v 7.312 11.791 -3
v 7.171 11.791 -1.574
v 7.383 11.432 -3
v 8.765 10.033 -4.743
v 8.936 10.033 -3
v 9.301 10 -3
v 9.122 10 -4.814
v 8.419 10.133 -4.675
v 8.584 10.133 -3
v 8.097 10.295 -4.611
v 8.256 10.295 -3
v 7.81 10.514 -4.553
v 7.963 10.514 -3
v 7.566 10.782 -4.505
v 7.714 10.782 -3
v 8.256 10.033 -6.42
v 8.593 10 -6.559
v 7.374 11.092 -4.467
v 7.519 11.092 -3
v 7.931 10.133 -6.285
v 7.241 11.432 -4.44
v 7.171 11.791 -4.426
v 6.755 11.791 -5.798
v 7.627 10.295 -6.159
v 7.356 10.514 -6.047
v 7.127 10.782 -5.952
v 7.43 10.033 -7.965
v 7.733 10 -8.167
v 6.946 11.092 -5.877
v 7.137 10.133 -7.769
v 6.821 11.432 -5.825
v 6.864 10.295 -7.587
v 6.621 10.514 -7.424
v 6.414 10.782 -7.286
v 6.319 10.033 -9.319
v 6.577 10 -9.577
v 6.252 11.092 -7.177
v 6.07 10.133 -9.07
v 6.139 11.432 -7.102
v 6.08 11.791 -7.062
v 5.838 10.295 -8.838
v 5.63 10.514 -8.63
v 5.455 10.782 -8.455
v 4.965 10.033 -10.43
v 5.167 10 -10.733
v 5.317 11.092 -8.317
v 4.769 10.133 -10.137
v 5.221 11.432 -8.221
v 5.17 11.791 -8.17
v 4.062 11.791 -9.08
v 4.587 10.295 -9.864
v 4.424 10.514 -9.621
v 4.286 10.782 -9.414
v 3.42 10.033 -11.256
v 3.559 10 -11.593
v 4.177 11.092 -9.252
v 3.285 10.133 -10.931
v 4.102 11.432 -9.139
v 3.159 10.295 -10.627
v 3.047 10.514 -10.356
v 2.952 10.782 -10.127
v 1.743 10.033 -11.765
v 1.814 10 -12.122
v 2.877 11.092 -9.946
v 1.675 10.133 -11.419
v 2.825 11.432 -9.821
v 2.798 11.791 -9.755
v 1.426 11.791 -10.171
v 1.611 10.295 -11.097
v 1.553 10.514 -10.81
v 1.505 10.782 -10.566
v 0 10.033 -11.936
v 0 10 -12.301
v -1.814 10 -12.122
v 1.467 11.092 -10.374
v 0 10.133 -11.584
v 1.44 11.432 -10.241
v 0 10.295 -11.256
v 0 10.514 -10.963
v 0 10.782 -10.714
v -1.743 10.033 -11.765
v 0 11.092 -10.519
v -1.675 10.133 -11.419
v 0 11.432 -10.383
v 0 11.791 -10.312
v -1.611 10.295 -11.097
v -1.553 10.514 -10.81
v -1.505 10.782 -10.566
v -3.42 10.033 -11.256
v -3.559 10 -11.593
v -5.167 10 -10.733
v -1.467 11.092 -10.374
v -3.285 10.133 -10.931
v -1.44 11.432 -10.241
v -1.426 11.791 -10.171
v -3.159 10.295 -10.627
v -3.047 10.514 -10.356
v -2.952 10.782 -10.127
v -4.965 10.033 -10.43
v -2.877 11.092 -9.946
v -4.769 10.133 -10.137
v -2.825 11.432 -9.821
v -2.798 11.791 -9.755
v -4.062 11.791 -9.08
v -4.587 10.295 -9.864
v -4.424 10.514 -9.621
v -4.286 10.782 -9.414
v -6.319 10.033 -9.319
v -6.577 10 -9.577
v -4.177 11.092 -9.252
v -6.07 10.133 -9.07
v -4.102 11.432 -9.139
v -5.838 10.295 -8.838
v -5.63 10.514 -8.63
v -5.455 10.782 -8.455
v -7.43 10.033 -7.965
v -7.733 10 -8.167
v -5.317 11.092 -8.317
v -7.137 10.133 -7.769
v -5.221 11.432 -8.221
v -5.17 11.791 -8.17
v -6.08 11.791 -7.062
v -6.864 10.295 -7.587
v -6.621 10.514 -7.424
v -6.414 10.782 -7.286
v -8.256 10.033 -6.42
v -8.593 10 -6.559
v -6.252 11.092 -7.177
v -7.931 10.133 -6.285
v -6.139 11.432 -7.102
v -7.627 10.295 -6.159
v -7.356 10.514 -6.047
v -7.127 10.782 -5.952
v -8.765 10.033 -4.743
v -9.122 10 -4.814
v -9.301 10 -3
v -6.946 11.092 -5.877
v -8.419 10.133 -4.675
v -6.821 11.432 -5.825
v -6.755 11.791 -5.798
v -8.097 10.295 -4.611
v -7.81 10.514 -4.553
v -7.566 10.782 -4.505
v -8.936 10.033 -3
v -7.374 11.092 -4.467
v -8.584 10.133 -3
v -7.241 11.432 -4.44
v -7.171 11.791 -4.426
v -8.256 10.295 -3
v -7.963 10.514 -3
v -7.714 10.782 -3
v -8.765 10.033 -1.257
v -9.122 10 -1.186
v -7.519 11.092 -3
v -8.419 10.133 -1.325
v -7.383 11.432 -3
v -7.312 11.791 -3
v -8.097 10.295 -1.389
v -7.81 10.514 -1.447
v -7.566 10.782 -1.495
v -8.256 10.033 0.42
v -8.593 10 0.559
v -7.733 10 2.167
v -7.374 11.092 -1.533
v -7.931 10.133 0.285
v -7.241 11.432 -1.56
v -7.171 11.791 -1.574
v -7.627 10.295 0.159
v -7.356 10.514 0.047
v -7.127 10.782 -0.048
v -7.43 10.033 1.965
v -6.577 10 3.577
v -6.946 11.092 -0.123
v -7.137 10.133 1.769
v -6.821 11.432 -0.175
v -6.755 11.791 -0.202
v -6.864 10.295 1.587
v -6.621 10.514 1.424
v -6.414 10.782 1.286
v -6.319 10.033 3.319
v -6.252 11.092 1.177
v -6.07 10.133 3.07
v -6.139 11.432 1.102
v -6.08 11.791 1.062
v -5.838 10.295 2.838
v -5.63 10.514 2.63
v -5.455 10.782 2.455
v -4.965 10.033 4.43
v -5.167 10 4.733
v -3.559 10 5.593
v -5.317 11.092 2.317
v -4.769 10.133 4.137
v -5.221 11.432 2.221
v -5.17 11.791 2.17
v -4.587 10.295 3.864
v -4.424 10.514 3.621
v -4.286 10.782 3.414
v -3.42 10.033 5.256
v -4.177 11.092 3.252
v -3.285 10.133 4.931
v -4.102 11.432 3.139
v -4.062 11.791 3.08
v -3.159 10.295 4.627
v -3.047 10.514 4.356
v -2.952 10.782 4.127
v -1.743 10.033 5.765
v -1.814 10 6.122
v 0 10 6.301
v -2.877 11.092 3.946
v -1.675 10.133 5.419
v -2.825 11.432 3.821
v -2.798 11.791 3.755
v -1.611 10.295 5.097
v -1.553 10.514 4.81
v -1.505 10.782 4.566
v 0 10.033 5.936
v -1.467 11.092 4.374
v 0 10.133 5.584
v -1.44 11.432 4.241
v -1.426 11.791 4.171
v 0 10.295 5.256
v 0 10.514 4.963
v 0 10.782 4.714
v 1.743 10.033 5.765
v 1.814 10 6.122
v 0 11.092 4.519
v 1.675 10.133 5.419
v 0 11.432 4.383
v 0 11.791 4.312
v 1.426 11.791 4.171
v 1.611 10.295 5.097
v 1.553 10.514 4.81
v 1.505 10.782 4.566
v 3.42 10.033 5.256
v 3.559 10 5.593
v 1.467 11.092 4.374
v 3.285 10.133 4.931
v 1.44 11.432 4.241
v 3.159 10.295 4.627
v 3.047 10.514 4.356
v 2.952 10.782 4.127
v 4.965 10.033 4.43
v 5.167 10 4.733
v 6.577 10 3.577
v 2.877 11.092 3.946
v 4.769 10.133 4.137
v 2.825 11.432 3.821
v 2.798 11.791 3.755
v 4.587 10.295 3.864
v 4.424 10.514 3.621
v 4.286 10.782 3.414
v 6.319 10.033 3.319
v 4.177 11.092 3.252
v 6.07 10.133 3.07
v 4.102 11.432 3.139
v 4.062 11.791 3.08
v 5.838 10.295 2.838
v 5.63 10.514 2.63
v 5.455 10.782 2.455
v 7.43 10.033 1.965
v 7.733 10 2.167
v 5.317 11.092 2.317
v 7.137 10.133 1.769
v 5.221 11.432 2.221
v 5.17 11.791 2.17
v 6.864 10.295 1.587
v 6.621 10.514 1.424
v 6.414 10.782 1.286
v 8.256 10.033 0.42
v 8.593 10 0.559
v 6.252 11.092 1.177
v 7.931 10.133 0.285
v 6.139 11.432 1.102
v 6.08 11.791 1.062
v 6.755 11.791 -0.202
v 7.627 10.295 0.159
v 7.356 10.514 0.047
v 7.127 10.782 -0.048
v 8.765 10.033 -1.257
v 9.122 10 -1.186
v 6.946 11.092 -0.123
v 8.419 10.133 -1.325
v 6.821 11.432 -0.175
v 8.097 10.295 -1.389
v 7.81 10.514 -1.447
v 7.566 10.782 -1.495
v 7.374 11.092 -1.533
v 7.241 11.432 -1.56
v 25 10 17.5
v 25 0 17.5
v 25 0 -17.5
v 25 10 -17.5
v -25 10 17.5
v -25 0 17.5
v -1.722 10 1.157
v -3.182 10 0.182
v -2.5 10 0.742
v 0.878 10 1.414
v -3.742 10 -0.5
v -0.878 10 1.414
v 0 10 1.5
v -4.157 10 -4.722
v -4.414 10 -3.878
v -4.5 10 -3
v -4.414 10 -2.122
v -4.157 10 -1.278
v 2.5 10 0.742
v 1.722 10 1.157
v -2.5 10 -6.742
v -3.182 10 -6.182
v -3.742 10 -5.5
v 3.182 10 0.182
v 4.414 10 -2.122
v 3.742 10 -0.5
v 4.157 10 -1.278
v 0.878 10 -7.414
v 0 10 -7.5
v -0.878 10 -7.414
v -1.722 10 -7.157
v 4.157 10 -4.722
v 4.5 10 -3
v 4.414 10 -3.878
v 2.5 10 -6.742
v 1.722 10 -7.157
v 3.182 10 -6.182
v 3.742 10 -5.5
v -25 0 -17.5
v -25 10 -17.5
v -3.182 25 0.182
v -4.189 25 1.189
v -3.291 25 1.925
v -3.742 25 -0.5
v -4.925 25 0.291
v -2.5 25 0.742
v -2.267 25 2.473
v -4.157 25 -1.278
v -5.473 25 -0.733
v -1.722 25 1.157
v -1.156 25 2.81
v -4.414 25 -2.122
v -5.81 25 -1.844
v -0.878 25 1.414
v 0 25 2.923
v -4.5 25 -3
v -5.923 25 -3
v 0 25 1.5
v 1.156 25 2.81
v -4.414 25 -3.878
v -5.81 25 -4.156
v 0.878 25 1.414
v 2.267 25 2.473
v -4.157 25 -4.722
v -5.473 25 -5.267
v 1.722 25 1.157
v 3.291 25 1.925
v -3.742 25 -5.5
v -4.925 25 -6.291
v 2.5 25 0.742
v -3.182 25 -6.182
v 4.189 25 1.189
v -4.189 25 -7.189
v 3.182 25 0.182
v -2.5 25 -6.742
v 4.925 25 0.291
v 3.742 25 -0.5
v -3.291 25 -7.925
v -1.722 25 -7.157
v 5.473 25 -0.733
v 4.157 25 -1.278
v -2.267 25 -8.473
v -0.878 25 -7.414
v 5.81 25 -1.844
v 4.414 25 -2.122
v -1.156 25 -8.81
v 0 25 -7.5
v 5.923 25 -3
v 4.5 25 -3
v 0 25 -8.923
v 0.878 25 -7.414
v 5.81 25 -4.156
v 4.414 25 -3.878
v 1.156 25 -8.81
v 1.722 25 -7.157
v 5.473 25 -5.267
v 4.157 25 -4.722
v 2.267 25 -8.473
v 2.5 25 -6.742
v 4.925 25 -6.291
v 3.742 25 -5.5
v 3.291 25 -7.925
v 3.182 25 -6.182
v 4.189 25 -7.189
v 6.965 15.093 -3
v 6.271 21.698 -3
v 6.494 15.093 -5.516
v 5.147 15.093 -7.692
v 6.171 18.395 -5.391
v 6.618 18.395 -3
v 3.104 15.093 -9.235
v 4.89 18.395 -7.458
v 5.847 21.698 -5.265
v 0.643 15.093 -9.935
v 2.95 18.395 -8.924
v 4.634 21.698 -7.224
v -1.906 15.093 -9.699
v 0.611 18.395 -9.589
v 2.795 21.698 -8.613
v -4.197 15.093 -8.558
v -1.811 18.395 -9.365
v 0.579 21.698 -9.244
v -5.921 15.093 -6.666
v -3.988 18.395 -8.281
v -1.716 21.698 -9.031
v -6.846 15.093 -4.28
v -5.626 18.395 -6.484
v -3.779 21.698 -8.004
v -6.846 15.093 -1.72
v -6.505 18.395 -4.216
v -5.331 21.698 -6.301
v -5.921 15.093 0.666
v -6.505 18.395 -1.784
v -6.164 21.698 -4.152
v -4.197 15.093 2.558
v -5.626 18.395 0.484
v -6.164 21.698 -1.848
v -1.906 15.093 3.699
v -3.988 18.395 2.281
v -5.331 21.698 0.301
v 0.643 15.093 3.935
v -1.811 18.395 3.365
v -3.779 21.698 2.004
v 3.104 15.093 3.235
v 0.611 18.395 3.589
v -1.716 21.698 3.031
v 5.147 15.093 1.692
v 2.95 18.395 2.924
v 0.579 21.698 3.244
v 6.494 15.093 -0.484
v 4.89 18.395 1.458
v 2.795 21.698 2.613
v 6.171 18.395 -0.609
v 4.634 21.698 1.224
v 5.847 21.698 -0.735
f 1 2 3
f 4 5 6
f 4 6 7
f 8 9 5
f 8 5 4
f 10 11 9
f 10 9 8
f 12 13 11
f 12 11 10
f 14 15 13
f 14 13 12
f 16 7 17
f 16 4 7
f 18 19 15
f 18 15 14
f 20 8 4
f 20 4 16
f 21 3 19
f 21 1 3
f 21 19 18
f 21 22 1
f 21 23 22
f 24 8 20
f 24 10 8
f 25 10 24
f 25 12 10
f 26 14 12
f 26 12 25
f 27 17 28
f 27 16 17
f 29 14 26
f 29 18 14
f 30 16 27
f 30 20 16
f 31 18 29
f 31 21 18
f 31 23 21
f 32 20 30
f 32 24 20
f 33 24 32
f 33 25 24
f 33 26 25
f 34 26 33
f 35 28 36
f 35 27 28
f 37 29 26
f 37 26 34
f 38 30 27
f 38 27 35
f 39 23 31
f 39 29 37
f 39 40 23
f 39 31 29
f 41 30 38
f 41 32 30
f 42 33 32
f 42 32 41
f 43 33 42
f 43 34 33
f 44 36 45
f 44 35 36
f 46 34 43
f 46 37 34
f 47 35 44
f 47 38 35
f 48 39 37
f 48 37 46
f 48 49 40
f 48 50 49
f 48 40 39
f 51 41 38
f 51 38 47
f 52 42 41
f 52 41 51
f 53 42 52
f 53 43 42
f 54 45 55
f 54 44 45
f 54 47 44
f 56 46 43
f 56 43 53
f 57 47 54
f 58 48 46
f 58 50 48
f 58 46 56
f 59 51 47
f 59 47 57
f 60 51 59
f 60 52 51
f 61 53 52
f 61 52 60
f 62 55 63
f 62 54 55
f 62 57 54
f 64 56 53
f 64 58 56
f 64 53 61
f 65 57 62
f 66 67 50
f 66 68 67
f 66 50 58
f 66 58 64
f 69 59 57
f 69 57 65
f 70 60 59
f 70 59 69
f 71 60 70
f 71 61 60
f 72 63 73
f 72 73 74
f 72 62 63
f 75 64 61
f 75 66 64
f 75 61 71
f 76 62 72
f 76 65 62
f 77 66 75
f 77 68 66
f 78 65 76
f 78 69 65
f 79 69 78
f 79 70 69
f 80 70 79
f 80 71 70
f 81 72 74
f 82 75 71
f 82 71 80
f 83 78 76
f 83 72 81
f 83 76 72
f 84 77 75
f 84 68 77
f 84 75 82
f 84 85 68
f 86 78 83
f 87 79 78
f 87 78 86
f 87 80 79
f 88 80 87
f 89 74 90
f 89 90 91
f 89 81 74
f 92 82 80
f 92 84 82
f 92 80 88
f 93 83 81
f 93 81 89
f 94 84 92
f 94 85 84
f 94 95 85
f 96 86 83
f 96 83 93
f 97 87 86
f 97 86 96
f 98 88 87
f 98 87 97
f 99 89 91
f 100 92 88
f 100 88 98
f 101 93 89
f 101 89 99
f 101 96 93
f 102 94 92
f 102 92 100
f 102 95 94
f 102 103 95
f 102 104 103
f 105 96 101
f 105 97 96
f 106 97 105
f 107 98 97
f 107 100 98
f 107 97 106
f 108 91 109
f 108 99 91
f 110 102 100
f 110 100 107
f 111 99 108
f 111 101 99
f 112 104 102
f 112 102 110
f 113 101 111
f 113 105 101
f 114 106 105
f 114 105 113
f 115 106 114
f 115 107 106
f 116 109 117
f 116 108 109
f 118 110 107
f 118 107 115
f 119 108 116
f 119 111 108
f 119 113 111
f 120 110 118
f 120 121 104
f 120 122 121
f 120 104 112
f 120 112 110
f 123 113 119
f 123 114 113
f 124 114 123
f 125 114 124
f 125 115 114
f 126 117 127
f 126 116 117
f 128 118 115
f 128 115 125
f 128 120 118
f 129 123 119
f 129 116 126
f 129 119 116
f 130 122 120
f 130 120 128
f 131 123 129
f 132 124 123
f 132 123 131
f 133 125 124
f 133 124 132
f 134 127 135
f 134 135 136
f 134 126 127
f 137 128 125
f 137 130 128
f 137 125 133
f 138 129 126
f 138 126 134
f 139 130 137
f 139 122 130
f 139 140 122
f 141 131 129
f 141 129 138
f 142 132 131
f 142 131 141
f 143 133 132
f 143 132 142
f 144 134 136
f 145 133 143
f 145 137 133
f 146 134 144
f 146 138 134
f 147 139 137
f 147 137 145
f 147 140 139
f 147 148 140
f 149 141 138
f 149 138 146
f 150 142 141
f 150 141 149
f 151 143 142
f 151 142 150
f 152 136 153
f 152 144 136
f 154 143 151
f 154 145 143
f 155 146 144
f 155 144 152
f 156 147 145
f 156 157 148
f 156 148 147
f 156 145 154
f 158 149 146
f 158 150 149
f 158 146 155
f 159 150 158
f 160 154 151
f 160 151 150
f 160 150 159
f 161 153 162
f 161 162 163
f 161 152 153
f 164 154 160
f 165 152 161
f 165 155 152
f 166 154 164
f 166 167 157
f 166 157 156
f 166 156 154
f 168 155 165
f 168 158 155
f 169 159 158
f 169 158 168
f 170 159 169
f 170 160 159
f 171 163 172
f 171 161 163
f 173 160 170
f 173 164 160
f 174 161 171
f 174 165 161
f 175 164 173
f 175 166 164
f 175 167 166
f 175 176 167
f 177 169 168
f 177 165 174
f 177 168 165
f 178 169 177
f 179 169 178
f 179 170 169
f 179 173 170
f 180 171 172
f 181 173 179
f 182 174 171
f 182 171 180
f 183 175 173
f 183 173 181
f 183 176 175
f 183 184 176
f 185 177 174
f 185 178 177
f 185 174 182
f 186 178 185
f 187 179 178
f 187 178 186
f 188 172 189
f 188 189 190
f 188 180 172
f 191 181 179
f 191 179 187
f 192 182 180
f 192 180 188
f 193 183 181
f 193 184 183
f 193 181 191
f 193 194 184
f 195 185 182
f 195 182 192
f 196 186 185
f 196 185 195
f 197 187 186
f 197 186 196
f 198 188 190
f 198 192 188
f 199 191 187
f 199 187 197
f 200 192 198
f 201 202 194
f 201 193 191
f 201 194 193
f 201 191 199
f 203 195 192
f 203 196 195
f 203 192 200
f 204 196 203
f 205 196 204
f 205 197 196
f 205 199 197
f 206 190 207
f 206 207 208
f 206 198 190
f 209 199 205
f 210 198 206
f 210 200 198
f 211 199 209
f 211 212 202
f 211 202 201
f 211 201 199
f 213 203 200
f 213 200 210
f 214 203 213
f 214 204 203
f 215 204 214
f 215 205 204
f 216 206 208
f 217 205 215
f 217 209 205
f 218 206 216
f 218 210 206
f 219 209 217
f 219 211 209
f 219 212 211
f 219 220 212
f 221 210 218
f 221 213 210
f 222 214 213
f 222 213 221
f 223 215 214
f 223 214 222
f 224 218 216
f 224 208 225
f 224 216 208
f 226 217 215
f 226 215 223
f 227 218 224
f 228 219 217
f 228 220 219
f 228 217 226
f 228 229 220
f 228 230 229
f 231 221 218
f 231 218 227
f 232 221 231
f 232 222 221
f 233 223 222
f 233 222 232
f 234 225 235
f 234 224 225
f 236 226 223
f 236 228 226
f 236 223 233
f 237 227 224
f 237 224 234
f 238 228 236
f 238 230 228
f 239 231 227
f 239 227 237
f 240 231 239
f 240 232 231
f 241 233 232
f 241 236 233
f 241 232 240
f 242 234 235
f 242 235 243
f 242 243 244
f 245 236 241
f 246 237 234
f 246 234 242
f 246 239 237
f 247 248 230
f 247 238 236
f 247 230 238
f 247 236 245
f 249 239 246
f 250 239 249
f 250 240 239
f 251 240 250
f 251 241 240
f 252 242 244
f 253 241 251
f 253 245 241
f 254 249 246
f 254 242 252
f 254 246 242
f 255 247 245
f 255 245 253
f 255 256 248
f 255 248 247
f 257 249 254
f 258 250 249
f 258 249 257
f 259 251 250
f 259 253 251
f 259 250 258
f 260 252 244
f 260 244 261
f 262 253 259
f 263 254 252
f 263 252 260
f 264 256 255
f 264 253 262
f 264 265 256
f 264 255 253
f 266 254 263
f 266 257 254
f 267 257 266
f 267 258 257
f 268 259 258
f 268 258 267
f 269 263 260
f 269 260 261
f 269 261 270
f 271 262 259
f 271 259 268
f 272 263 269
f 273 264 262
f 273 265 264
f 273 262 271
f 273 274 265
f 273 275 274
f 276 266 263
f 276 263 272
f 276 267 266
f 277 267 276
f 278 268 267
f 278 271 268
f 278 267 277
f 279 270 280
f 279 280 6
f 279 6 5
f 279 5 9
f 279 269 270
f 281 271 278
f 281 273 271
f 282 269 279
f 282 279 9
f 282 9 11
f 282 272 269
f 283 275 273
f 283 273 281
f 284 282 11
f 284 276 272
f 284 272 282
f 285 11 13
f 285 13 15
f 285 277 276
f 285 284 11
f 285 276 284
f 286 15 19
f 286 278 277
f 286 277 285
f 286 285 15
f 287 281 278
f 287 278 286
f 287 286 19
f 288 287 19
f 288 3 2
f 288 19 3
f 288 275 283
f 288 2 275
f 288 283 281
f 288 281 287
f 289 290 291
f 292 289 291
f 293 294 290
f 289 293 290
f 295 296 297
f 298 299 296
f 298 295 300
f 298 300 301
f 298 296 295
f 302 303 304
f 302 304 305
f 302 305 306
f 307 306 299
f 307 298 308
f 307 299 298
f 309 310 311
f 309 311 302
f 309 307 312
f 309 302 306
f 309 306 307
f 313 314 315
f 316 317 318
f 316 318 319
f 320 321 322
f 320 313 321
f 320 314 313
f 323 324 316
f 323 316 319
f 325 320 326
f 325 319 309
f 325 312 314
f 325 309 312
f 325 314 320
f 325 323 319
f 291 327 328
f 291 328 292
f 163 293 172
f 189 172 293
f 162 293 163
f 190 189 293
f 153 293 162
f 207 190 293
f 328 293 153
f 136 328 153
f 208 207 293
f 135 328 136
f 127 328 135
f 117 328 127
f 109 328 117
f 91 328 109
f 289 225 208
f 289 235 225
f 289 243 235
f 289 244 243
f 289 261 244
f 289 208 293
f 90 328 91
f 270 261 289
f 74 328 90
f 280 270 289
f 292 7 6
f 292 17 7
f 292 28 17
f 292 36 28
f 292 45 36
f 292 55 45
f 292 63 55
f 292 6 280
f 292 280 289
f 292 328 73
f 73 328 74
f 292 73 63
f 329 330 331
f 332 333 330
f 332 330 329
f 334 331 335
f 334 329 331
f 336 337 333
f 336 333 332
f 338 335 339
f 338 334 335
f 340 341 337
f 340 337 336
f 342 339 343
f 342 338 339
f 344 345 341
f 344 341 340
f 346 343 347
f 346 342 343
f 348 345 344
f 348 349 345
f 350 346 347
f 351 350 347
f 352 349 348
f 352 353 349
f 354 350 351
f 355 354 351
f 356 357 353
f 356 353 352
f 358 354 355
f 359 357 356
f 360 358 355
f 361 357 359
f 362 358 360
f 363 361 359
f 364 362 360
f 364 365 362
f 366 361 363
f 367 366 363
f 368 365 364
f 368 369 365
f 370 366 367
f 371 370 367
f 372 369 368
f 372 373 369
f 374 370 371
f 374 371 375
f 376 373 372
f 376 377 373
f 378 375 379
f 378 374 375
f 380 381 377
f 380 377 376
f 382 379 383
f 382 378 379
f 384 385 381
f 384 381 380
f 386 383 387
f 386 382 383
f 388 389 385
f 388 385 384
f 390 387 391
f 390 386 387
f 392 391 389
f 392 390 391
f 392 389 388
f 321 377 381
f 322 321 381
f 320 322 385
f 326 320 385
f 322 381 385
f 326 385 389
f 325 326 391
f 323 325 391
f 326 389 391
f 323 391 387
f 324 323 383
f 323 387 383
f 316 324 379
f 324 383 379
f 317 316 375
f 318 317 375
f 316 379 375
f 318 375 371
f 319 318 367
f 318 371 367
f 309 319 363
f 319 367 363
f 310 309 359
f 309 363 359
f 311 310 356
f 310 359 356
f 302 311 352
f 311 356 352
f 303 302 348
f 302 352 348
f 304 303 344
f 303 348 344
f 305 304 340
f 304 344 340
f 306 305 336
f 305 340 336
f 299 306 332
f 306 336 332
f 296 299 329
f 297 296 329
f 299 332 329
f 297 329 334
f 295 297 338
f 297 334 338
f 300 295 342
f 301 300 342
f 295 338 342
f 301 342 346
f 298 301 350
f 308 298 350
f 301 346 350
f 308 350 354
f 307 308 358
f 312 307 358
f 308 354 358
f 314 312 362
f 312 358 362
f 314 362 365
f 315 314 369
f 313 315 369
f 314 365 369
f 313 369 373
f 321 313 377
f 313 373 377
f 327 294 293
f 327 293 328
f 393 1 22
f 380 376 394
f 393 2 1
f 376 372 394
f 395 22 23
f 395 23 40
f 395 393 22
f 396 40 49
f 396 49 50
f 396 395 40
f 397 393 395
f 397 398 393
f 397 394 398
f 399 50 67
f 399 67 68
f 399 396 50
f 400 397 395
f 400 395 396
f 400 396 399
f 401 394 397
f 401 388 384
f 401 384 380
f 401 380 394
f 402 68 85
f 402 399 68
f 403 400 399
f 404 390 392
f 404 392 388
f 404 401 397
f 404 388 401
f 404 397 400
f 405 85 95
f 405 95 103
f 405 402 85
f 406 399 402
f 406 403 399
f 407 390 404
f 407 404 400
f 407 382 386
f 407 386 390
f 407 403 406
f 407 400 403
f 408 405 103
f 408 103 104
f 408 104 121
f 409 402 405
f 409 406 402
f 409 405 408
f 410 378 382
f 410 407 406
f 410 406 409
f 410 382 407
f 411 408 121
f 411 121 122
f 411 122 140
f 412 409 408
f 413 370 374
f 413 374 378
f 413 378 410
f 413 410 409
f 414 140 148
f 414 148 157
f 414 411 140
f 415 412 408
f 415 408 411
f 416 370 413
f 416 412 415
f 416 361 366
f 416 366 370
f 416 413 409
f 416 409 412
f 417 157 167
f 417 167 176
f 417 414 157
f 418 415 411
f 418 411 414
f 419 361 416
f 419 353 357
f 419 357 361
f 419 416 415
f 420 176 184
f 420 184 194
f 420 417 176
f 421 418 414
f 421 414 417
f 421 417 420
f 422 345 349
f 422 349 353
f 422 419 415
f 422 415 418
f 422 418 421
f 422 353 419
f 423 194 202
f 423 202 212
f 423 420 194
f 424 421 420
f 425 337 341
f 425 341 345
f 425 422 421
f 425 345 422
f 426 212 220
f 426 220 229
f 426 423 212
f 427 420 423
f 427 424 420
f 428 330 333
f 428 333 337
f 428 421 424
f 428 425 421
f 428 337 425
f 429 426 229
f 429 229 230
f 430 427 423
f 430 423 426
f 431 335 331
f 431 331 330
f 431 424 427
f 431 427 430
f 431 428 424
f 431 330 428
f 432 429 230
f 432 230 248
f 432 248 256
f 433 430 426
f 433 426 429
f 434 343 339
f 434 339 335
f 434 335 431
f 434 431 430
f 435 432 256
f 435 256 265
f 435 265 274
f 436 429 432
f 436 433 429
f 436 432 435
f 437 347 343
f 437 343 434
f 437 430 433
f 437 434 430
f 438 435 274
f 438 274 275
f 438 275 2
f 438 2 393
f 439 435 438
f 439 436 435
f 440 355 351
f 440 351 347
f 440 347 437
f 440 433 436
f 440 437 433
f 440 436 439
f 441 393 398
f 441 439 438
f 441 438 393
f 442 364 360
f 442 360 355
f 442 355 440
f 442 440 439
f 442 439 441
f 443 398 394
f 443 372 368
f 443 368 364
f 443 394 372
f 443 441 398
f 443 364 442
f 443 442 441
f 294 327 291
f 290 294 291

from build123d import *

# Parameters (mm, degrees)
SKETCH1_W           = 50
SKETCH1_H           = 35
BOSS_EXTRUDE1_DEPTH = 10
SKETCH2_R           = 7.5
BOSS_EXTRUDE2_DEPTH = 15
BOSS_EXTRUDE2_TAPER = 6
SKETCH3_R           = 4.5
CUT_EXTRUDE1_DEPTH  = 15
FILLET1_R           = 2


with BuildPart() as part:
    # Sketch1 → Boss-Extrude1 (new body)
    with BuildSketch(Plane(origin=(0, 0, 0), x_dir=(1, 0, 0), z_dir=(0, 1, 0))):
        Rectangle(SKETCH1_W, SKETCH1_H)
    extrude(amount=BOSS_EXTRUDE1_DEPTH)

    # Sketch2 → Boss-Extrude2 (add)
    with BuildSketch(Plane(origin=(0, 10, 0), x_dir=(1, 0, 0), z_dir=(0, 1, 0))):
        with Locations((0, 3)):
            Circle(SKETCH2_R)
    extrude(amount=BOSS_EXTRUDE2_DEPTH, taper=BOSS_EXTRUDE2_TAPER)

    # Sketch3 → Cut-Extrude1 (cut)
    with BuildSketch(Plane(origin=(0, 25, 0), x_dir=(1, 0, 0), z_dir=(0, 1, 0))):
        with Locations((0, 3)):
            Circle(SKETCH3_R)
    extrude(amount=-CUT_EXTRUDE1_DEPTH, mode=Mode.SUBTRACT)

    # Fillet1
    fillet1_edges = [part.edges().sort_by_distance(p)[0] for p in [
        (-7.5, 10, -3),
    ]]
    fillet(fillet1_edges, radius=FILLET1_R)


solid = part.part
